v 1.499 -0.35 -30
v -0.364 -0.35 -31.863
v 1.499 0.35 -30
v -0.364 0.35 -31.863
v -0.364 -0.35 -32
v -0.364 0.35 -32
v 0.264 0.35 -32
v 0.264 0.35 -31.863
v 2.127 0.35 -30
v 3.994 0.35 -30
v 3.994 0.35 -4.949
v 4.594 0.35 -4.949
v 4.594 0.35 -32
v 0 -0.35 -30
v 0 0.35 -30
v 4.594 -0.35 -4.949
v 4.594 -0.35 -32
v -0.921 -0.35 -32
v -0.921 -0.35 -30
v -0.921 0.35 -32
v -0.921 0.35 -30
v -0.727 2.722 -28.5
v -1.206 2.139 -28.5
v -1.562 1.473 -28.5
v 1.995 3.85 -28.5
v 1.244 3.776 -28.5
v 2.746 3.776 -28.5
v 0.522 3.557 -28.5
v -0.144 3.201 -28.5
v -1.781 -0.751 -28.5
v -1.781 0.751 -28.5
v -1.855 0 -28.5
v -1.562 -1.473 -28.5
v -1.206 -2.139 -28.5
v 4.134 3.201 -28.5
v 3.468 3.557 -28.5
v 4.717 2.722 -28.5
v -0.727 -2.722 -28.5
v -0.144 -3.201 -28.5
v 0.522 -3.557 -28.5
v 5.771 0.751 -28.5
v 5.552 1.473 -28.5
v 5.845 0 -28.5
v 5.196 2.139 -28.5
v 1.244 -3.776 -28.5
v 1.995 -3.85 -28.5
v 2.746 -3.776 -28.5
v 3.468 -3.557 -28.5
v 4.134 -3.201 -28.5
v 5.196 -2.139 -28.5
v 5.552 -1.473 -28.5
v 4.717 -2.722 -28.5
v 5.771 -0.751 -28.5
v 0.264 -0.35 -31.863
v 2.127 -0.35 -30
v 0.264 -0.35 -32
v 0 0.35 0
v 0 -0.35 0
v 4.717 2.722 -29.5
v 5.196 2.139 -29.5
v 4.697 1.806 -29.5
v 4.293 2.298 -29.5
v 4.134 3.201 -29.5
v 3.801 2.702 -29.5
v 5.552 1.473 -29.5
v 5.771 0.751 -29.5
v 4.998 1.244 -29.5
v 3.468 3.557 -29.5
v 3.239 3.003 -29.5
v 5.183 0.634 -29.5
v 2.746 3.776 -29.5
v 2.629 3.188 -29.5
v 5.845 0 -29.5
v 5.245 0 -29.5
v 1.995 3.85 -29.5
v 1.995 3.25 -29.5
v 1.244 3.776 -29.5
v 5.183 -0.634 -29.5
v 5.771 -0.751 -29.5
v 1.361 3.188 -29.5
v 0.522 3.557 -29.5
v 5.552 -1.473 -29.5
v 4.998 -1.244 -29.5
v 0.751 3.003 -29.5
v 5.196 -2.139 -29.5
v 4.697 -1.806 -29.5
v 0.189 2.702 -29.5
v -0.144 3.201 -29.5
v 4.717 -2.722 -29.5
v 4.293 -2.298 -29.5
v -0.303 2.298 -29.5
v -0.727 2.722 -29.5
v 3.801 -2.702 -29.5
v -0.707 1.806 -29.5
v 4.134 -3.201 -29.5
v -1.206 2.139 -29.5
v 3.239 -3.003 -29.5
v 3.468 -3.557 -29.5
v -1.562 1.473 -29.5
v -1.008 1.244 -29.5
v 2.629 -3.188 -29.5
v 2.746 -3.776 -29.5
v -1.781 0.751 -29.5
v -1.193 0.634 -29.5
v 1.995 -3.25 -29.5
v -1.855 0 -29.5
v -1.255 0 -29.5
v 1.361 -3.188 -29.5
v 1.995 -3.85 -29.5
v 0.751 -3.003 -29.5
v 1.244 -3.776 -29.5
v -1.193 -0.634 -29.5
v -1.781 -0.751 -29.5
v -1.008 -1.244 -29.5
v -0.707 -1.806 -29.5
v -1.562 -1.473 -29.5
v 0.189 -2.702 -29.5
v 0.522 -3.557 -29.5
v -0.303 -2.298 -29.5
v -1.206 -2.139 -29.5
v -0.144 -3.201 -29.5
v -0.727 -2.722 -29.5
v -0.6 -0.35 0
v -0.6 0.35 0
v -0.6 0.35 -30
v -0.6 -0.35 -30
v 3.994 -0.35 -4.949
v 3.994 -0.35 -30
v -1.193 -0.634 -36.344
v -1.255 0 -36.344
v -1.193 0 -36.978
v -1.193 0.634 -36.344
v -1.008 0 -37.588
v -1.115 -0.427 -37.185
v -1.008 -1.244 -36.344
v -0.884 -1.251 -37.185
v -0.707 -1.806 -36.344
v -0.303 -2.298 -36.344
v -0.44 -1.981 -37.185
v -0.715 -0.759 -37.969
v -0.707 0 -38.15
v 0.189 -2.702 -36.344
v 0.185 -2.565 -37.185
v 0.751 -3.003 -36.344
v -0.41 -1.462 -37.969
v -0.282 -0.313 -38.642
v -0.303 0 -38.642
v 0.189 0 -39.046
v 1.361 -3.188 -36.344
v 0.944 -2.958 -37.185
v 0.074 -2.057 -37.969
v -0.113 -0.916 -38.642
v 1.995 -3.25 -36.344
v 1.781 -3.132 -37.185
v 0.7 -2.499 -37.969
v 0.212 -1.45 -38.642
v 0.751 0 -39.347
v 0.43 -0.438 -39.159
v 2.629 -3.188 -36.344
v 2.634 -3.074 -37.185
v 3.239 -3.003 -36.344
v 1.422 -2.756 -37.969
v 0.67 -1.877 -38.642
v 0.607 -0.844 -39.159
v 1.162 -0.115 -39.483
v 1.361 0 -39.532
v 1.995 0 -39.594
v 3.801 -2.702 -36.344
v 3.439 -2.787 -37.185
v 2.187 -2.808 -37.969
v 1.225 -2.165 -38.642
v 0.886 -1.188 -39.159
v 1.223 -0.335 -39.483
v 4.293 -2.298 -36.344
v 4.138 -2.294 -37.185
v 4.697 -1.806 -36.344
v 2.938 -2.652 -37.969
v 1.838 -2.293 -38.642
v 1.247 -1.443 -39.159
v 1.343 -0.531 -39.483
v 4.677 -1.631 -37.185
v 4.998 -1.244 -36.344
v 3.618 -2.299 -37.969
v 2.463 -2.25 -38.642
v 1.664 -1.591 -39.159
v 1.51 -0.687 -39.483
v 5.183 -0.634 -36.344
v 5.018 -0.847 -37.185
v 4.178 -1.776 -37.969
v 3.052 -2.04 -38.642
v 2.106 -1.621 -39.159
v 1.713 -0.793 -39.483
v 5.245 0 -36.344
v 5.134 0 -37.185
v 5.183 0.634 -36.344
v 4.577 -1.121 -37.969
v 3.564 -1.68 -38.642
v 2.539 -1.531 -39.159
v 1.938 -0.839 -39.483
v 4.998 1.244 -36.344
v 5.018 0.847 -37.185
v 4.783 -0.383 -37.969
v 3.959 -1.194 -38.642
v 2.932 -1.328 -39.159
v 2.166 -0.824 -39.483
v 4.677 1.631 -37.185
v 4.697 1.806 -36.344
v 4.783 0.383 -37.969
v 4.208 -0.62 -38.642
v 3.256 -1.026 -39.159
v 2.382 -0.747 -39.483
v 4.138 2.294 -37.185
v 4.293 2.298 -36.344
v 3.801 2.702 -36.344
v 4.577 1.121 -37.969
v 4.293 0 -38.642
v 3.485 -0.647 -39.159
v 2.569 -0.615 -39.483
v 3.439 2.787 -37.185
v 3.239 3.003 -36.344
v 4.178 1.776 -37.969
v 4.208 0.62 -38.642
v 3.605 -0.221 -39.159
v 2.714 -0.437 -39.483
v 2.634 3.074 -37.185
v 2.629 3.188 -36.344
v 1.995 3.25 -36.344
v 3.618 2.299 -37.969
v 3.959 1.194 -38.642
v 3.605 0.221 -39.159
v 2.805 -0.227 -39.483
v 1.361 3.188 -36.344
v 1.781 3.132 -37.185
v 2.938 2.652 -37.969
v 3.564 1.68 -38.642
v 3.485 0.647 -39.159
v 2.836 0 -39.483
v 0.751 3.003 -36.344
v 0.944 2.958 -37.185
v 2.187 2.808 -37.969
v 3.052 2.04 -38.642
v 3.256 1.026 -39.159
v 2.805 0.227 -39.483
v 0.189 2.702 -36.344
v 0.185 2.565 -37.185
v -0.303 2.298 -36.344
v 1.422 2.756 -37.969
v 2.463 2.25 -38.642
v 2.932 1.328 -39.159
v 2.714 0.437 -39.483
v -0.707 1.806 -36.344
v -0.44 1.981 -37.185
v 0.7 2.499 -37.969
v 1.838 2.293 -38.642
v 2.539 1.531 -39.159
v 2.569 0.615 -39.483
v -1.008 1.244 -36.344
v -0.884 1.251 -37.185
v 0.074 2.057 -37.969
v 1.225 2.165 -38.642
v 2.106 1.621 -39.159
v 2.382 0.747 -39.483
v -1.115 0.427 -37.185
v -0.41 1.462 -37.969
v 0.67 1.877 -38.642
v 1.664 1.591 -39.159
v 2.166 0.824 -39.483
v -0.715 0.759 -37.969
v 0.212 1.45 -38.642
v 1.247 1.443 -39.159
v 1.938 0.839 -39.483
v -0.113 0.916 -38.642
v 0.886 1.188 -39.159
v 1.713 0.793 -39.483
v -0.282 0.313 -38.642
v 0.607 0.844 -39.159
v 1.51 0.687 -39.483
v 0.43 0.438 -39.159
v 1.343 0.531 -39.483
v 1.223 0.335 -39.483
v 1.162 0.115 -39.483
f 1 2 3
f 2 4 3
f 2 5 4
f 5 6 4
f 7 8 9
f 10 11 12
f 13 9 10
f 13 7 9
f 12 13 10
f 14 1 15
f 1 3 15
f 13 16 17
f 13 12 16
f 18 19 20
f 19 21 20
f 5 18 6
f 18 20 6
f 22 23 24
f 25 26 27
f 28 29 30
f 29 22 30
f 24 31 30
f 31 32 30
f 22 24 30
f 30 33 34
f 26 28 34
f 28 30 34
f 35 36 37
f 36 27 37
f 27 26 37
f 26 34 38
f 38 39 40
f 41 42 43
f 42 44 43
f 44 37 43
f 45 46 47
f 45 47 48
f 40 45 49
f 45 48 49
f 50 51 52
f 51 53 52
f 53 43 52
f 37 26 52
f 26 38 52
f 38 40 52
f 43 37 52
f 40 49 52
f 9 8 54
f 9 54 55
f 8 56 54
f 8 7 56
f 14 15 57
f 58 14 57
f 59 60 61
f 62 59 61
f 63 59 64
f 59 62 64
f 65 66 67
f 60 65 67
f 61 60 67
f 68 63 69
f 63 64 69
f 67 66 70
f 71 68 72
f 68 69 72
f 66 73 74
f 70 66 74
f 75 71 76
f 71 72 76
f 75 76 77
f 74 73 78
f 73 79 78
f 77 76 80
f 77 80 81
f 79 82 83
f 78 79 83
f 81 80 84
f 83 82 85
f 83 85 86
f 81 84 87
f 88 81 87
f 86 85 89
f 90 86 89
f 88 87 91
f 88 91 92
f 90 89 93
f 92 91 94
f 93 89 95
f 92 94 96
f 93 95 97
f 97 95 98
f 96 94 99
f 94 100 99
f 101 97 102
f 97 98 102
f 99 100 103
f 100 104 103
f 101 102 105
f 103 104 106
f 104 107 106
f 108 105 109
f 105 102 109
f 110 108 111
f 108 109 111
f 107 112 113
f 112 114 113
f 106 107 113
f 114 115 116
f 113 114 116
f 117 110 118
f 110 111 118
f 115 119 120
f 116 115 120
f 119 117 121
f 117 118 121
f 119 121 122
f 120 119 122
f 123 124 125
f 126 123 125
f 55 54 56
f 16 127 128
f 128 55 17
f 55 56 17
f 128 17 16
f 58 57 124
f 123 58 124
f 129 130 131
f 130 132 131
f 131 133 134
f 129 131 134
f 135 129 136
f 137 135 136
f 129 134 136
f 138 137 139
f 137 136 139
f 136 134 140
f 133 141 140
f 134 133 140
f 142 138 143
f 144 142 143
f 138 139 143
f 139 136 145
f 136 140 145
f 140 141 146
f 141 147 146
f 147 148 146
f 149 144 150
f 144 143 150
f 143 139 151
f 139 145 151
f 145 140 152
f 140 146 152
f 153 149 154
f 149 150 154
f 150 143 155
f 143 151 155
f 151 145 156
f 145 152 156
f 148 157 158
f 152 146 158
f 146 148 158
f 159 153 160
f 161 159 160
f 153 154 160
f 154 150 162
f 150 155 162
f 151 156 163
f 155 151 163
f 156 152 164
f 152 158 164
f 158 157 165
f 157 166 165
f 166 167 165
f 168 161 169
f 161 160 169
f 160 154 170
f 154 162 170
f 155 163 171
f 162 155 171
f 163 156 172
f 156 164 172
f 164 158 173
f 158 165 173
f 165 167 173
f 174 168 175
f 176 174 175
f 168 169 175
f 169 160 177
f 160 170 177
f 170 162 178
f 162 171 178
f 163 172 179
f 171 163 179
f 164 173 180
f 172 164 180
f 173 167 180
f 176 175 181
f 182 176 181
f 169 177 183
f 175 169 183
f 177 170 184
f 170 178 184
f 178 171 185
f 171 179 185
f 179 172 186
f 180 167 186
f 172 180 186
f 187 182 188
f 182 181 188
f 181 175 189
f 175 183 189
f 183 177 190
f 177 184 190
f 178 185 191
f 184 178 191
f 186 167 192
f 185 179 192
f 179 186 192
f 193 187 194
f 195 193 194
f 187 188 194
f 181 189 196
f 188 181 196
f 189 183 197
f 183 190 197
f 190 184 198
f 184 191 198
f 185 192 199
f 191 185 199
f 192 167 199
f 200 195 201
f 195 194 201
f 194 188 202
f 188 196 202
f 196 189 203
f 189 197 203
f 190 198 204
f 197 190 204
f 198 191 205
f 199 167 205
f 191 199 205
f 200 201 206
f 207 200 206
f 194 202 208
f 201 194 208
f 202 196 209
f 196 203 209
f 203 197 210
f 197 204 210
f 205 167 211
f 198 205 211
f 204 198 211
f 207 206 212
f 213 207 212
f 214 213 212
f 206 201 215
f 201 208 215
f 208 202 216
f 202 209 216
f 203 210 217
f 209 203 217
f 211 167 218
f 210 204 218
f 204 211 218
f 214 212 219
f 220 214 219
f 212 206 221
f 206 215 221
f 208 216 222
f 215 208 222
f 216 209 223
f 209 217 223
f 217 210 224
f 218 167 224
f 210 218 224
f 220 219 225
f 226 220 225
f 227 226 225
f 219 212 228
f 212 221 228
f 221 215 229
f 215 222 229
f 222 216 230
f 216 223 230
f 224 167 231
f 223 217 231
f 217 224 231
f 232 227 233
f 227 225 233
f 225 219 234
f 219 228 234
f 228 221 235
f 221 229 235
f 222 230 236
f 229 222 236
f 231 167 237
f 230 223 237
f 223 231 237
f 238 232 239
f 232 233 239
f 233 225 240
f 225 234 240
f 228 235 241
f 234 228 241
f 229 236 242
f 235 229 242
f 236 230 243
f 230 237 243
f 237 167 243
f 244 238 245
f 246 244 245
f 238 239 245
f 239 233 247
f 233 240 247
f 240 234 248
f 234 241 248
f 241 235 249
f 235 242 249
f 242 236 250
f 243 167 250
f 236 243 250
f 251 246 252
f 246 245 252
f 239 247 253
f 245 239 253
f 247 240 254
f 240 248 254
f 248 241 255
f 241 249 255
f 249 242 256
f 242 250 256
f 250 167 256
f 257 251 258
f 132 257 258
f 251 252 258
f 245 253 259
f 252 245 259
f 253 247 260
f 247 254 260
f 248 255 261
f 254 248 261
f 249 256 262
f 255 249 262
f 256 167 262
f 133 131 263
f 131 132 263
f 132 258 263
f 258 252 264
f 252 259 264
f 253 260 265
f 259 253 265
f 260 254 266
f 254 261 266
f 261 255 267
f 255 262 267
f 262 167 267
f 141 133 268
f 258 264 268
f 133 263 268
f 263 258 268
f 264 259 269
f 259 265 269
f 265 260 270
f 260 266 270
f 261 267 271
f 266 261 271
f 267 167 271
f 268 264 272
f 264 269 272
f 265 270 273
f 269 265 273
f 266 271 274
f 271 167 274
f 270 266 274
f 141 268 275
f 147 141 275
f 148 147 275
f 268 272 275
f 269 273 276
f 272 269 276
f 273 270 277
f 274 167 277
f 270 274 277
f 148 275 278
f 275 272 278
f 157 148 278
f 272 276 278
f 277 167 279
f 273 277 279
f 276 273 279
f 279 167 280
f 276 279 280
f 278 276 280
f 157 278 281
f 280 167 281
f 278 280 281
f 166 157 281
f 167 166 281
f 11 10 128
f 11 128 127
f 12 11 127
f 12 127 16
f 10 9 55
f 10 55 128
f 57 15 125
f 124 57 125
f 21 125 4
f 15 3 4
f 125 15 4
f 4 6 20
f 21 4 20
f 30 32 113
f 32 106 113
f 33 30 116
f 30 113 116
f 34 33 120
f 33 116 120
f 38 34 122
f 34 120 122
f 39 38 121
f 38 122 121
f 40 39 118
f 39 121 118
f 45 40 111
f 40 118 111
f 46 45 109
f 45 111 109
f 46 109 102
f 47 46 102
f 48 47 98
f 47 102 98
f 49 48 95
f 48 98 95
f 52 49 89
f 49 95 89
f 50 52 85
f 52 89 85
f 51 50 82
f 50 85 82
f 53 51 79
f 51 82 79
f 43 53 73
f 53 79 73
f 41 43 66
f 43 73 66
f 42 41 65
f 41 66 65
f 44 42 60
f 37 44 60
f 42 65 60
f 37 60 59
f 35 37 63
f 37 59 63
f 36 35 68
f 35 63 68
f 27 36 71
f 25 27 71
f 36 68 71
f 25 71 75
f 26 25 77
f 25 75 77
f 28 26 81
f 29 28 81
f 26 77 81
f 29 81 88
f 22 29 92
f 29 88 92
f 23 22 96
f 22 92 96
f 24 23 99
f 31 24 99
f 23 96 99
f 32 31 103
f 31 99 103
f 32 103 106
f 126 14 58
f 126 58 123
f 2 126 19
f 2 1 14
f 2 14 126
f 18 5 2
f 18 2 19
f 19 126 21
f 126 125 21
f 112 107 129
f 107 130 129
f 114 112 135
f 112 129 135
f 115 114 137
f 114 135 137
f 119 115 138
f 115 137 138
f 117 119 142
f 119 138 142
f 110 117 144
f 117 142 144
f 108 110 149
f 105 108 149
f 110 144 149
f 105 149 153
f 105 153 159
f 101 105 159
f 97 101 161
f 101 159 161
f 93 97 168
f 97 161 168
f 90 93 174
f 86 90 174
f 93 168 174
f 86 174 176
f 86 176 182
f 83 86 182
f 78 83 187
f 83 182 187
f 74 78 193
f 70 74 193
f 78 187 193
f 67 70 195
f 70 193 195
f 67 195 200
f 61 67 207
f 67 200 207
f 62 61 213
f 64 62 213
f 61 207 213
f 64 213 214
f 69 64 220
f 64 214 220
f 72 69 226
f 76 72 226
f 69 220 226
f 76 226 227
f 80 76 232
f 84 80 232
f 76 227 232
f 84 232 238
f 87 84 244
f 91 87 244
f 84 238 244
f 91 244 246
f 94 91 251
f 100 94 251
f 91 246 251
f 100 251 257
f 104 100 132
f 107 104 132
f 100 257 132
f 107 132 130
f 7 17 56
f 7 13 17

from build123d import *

# Parameters (mm, degrees)
BOSS_EXTRUDE1_DEPTH = 0.35
BOSS_EXTRUDE2_DEPTH = 0.35


with BuildPart() as part:
    # Sketch1 → Boss-Extrude1 (new, symmetric)
    with BuildSketch(Plane(origin=(0, 0, 0), x_dir=(1, 0, 0), z_dir=(0, 1, 0))):
        Polygon((-0.6, 0), (-0.6, 30), (-0.921269942, 30), (-0.921269942, 32), (-0.364499286, 32), (-0.364499286, 31.863365618), (1.498866332, 30), (0, 30), (0, 0), align=None)
    extrude(amount=BOSS_EXTRUDE1_DEPTH, both=True)


with BuildPart() as body_2:
    # Sketch2 → Boss-Extrude2 (new, symmetric)
    with BuildSketch(Plane(origin=(0, 0, 0), x_dir=(1, 0, 0), z_dir=(0, 1, 0))):
        Polygon((0.263788456, 32), (0.263788456, 31.863365618), (2.127154074, 30), (3.993555422, 30), (3.993555422, 4.948502035), (4.593555422, 4.948502035), (4.593555422, 32), align=None)
    extrude(amount=BOSS_EXTRUDE2_DEPTH, both=True)


with BuildPart() as body_3:
    # Sketch3 → Revolve1 (revolve)
    with BuildSketch(Plane(origin=(0, 0, 0), x_dir=(1, 0, 0), z_dir=(0, 1, 0)), mode=Mode.PRIVATE) as revolve1_sk:
        with BuildLine():
            Line((1.995, 28.5), (5.845, 28.5))
            Line((5.845, 28.5), (5.845, 29.5))
            Line((5.845, 29.5), (5.245, 29.5))
            Line((5.245, 29.5), (5.245, 36.344198407))
            ThreePointArc((5.245, 36.344198407), (4.293097039, 38.642295446), (1.995, 39.594198407))
            Line((1.995, 39.594198407), (1.995, 28.5))
        make_face()
    revolve(revolve1_sk.sketch.rotate(Axis((1.995, 0, -38.642405776), (0, 0, 1)), 180), axis=Axis((1.995, 0, -38.642405776), (0, 0, 1)))


solid = Compound([part.part, body_2.part, body_3.part])
